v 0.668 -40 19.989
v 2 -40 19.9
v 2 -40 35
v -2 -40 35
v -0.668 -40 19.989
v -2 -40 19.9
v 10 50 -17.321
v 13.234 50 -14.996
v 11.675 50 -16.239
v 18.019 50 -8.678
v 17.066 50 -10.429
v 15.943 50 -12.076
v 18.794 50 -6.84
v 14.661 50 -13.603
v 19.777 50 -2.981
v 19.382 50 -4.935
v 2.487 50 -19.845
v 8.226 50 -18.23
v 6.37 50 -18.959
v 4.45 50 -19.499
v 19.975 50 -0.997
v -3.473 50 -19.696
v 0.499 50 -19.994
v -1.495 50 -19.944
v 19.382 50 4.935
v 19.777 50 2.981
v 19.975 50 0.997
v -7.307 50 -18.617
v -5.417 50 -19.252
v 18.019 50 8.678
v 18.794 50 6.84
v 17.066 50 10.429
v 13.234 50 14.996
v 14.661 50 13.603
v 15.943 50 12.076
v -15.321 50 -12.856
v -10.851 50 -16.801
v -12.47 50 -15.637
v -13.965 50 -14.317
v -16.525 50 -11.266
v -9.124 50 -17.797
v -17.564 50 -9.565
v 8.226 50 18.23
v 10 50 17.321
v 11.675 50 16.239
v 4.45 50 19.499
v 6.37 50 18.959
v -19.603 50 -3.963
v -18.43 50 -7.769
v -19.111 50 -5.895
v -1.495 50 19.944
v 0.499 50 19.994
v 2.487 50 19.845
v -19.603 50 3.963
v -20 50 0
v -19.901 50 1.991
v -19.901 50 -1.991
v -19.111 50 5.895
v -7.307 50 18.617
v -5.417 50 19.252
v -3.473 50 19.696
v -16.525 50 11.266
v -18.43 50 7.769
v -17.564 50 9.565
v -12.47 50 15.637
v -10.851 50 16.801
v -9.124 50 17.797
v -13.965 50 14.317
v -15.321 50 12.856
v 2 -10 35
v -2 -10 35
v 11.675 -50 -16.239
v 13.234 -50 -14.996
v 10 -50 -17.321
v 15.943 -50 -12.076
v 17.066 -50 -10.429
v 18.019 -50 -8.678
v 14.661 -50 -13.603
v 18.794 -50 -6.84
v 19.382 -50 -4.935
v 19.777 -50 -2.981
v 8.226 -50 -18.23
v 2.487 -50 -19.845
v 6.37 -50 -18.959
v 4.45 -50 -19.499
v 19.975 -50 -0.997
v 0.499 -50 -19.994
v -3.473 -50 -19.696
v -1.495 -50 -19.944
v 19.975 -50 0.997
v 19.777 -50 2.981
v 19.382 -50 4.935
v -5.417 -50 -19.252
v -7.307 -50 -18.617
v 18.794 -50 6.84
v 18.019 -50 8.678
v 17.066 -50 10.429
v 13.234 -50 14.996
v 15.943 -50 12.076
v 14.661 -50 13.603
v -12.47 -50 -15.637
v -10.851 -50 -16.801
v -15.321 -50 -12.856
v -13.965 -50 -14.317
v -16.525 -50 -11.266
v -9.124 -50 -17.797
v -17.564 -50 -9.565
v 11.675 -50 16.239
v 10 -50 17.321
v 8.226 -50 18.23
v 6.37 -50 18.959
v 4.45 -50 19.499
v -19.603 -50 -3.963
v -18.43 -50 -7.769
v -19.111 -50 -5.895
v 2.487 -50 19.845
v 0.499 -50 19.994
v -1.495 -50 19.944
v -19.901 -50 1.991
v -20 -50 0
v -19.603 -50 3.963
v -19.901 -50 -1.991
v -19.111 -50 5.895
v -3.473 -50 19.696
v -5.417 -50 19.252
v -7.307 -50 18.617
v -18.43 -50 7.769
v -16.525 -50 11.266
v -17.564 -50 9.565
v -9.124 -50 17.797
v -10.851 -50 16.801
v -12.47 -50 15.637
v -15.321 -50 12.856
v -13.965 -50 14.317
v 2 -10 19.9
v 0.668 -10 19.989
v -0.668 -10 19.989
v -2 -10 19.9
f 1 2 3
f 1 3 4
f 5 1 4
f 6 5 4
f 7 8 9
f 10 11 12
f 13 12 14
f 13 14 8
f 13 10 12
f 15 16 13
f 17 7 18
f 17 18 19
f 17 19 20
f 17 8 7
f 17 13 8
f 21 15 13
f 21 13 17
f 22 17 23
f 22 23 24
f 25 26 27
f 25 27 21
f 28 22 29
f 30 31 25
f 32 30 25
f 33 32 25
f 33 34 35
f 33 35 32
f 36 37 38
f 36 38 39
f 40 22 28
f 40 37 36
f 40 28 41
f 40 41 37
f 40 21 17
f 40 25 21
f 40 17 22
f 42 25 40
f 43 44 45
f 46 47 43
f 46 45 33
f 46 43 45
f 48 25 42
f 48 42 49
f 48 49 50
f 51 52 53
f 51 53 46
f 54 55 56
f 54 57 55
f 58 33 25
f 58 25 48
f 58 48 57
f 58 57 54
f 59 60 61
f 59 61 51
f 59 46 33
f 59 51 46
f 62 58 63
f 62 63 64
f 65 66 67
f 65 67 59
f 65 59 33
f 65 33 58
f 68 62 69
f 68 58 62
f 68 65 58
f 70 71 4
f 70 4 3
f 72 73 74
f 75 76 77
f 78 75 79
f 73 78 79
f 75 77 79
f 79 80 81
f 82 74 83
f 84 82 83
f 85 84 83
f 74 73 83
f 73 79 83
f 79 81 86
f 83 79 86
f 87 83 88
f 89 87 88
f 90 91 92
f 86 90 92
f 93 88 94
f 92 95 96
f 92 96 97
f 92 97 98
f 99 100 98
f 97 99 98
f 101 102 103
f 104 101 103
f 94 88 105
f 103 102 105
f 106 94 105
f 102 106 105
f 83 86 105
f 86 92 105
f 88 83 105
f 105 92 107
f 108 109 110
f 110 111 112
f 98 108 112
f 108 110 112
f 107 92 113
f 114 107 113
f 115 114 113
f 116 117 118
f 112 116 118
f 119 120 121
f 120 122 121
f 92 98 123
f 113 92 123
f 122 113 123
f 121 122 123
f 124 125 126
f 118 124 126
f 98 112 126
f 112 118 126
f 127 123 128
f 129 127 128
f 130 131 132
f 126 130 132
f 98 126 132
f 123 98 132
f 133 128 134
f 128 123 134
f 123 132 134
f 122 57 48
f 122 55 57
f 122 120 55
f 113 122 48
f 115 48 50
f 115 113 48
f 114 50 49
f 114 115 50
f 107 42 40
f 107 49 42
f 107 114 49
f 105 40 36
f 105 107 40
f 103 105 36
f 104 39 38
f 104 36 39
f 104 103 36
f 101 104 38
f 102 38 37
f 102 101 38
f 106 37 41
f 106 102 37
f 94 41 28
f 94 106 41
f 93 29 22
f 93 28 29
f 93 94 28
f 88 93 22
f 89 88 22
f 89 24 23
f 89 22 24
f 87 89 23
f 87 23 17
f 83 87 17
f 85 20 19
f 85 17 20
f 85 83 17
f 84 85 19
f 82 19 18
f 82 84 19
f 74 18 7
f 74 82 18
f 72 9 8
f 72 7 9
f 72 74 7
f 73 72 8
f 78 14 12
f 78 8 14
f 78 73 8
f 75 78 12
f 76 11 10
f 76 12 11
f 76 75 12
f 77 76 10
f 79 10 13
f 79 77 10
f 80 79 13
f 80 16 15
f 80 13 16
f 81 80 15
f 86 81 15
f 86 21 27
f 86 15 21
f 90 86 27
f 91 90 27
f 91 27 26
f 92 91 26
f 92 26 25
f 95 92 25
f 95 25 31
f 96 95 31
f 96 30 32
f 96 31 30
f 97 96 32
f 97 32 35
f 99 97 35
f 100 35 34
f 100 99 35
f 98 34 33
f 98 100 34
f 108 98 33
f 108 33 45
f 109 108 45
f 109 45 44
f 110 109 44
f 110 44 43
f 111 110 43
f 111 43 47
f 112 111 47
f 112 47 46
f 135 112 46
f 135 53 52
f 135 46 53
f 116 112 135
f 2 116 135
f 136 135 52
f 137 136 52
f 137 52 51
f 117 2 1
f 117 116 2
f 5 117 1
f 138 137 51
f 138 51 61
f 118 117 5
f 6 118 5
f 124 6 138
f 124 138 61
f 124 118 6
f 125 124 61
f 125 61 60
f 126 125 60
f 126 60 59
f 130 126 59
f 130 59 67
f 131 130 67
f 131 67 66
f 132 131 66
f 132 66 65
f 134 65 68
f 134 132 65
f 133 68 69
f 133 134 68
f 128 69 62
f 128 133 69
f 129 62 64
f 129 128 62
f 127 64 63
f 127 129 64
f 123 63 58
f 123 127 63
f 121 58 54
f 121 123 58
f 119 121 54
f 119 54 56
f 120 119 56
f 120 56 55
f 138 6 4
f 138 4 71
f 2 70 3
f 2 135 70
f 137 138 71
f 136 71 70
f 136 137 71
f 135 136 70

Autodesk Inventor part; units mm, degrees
ref_plane "YZ Plane" through (0, 0, 0) normal (1, 0, 0) x (0, 1, 0)
ref_plane "XZ Plane" through (0, 0, 0) normal (0, 1, 0) x (-1, 0, 0)
sketch "Sketch1" plane through (0, 0, 0) normal (0, 1, 0) x (-1, 0, 0)
  circle A0 centre (0, 0) radius 20
  dimension "d0" = 40
extrude "Extrusion1" add sketch "Sketch1" along normal mid plane 100
ref_plane "Work Plane1" through (0, 0, 20) normal (0, 0, 1) x (1, 0, 0)
sketch "Sketch2" plane through (0, 0, 20) normal (0, 0, 1) x (1, 0, 0)
  line L0 (-2, -10) -> (2, -10)
  line L1 (2, -10) -> (2, -40)
  line L2 (2, -40) -> (-2, -40)
  line L3 (-2, -40) -> (-2, -10)
  point P0 (0, 0)
  dimension "d3" = 4
  dimension "d4" = 2
  dimension "d5" = 30
  dimension "d6" = 10
extrude "Extrusion2" add sketch "Sketch2" along normal blind 15 and the other way blind 5
properties part number "fuel" material "PAEK Plastic"
